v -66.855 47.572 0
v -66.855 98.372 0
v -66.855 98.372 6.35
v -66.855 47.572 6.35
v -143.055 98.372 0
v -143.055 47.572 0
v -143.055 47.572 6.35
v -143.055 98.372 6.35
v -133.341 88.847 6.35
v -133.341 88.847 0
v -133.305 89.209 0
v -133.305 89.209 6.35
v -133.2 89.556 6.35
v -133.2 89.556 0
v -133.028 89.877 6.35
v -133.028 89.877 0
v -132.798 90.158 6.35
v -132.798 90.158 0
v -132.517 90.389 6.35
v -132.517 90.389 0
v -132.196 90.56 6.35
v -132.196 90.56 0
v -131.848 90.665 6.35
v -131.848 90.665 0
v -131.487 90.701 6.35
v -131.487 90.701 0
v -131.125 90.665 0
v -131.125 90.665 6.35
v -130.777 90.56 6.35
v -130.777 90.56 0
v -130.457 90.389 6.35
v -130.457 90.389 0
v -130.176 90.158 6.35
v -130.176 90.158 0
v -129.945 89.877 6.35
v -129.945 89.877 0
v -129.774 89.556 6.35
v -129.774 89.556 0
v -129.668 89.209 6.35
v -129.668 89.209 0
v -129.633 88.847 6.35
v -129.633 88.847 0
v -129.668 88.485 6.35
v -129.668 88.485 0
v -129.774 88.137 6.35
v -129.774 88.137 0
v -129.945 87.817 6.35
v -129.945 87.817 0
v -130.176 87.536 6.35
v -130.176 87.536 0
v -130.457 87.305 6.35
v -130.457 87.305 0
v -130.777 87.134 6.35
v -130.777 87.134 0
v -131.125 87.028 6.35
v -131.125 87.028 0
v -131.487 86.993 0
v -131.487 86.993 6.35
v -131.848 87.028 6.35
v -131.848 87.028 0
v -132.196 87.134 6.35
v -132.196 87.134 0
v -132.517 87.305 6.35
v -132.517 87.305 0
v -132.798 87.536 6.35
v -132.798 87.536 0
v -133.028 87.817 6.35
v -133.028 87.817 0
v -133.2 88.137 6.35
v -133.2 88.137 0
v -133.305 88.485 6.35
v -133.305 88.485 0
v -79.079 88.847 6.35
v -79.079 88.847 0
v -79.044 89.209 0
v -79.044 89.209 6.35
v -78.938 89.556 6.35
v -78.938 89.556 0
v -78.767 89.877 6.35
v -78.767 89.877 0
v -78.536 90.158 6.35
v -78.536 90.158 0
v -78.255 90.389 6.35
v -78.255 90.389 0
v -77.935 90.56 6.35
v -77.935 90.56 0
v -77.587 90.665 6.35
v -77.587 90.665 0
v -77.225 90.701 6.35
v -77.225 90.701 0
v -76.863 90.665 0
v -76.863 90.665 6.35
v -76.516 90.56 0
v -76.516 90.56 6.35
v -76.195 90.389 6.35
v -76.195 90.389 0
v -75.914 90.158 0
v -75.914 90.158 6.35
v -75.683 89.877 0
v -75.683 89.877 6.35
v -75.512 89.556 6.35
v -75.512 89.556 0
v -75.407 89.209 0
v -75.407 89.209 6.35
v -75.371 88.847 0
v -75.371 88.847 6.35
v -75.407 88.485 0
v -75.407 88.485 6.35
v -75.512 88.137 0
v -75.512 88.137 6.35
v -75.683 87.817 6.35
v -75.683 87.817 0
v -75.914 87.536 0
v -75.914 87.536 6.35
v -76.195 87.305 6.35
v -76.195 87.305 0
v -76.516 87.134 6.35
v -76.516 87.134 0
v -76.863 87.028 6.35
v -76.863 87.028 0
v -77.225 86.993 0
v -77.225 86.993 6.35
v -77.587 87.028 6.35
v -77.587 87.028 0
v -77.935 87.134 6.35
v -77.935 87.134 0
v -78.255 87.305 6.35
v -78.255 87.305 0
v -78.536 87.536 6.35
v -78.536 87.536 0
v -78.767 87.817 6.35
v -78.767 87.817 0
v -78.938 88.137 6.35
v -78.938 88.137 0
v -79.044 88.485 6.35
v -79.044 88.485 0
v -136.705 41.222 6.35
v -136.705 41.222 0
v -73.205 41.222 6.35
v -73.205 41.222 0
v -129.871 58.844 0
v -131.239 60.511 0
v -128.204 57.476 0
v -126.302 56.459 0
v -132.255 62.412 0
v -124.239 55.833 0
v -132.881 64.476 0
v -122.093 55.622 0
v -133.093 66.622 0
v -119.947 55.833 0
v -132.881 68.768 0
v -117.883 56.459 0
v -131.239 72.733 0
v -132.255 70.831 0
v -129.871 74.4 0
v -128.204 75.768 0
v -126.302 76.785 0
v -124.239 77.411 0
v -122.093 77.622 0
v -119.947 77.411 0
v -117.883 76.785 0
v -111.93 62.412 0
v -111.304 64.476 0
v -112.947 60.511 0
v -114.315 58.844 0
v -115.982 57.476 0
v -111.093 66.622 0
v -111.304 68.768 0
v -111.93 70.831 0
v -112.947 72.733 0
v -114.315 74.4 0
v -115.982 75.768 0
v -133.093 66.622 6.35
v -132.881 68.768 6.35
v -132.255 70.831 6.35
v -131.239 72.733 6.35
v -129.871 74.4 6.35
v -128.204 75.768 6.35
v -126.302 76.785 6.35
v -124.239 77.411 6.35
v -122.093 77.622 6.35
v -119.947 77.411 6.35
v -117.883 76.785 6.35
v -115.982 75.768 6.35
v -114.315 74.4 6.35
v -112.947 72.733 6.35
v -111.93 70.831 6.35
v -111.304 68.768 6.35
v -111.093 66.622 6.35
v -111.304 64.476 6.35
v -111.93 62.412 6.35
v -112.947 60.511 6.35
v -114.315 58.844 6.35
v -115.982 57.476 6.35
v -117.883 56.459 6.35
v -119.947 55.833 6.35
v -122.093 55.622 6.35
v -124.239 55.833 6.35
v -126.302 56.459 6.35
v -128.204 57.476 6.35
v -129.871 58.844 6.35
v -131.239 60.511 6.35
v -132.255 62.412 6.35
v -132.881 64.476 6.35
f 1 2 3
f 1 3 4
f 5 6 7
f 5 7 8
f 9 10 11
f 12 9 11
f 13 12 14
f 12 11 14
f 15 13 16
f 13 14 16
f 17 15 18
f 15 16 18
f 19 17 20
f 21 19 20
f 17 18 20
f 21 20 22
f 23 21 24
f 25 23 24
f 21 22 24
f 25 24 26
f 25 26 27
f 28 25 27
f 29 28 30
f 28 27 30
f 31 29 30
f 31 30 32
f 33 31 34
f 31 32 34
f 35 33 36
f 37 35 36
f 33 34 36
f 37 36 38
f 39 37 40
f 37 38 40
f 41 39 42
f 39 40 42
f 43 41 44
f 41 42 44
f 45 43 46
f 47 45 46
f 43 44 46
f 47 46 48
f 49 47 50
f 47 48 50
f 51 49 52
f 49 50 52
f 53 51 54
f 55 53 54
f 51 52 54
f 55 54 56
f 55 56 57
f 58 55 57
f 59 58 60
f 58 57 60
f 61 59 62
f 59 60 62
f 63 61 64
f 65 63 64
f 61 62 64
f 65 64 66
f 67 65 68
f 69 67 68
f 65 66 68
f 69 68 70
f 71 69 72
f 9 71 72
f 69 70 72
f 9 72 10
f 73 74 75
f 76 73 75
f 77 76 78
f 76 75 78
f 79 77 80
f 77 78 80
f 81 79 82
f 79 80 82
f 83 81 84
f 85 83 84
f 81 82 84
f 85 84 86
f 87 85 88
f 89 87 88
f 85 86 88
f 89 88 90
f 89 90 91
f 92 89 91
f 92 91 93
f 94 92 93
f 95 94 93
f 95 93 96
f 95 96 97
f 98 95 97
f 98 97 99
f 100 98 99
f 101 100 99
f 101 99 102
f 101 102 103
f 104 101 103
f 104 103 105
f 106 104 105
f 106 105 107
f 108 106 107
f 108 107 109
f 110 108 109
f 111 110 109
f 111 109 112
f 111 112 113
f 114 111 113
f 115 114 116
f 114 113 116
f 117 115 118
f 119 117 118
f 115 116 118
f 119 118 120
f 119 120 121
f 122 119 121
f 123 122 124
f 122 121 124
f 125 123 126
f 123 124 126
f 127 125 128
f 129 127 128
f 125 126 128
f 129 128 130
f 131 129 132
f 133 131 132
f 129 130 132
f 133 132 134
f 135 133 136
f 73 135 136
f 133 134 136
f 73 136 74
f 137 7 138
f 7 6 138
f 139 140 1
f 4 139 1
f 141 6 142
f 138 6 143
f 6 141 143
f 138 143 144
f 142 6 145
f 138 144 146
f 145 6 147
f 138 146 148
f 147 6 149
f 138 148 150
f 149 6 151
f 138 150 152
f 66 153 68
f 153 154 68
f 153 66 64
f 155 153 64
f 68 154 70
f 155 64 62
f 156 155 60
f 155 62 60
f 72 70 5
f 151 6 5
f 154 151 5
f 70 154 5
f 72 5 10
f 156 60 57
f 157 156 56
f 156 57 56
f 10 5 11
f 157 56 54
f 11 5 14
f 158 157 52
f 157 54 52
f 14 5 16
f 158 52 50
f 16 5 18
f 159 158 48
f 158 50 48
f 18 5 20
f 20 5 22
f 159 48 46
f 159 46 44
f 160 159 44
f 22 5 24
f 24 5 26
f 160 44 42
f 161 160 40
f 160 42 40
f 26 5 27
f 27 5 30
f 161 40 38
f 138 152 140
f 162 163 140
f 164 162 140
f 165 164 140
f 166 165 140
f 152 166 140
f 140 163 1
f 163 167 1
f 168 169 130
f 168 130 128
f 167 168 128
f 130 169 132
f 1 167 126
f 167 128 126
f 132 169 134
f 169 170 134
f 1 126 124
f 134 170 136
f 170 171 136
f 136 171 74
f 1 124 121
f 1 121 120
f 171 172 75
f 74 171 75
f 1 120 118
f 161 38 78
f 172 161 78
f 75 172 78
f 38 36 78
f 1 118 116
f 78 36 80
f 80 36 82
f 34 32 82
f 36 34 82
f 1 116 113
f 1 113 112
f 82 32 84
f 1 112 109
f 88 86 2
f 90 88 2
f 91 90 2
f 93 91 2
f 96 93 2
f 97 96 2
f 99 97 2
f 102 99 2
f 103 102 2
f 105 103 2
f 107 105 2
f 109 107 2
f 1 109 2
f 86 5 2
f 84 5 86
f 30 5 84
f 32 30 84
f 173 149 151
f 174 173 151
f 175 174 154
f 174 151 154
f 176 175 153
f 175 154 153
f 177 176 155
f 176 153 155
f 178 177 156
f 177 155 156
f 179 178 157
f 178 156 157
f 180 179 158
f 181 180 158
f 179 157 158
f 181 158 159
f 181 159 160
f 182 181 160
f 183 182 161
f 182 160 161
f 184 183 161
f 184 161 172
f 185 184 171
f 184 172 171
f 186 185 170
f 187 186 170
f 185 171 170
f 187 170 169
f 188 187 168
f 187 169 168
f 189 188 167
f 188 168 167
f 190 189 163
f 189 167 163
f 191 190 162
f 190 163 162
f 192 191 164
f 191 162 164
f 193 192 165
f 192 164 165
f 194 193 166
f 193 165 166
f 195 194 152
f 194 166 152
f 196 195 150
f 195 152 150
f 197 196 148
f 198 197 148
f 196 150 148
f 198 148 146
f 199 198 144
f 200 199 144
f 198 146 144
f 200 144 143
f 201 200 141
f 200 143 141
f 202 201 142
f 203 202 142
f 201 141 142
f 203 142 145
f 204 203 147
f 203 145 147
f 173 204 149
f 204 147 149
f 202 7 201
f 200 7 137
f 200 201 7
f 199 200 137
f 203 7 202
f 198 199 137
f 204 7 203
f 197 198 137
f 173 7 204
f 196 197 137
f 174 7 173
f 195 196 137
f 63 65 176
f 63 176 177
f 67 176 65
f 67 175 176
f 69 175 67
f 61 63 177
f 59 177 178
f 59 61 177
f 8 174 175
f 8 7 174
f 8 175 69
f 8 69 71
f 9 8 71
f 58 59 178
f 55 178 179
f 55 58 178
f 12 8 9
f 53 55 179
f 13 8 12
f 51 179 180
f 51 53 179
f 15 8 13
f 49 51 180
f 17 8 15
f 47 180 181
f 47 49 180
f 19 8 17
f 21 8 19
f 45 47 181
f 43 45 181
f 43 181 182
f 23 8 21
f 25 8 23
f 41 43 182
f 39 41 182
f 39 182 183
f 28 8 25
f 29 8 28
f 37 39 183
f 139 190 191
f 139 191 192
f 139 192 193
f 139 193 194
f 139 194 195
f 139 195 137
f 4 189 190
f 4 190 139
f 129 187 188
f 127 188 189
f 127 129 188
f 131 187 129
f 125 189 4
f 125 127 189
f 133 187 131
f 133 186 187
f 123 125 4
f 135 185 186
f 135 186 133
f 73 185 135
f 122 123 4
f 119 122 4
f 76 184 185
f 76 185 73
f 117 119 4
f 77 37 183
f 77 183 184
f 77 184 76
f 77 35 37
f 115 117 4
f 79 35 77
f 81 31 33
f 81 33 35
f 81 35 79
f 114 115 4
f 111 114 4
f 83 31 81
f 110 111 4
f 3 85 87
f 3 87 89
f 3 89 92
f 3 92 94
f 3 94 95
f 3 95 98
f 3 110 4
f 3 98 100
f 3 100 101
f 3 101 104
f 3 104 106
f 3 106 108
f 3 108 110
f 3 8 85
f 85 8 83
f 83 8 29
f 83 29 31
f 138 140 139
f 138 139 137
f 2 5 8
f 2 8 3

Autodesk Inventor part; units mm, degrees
ref_plane "YZ Plane" through (0, 0, 0) normal (1, 0, 0) x (0, 1, 0)
ref_plane "XZ Plane" through (0, 0, 0) normal (0, 1, 0) x (-1, 0, 0)
ref_plane "XY Plane" through (0, 0, 0) normal (0, 0, 1) x (1, 0, 0)
sketch "Sketch1" plane through (0, 0, 0) normal (0, 0, 1) x (1, 0, 0)
  line L0 (-73.2051, 41.2219) -> (-136.7051, 41.2219)
  line L1 (-143.0551, 47.5719) -> (-143.0551, 98.3719)
  line L2 (-143.0551, 98.3719) -> (-66.8551, 98.3719)
  line L3 (-66.8551, 98.3719) -> (-66.8551, 47.5719)
  line L4 (-143.0551, 47.5719) -> (-136.7051, 41.2219)
  line L5 (-73.2051, 41.2219) -> (-66.8551, 47.5719)
  point P0 (0, 0)
  point P1 (-66.8551, 41.2219)
  point P2 (-143.0551, 41.2219)
  point P3 (-117.6551, 41.2219)
  point P4 (-143.0551, 66.6219)
  point P5 (-66.8551, 72.9719)
  point P6 (-92.2551, 41.2219)
  point P7 (-143.0551, 41.2219)
  point P8 (-66.8551, 41.2219)
  dimension "d0" = 76.2
  dimension "d1" = 57.15
  dimension "d10" = 6.35
  dimension "d11" = 6.35
  dimension "d12" = 6.35
extrude "Extrusion1" add sketch "Sketch1" along normal blind 6.35
sketch "Sketch2" plane through (0, 0, 6.35) normal (0, 0, 1) x (1, 0, 0)
  line L0 (-130.3551, 77.0986) -> (-130.3551, 56.1453)
  line L1 (-130.3551, 66.6219) -> (-98.3601, 66.6219) construction
  arc A0 (-119.7326, 65.7975) -> (-124.4934, 65.9243) centre (-122.0928, 66.6219) ccw
  line L2 (-124.4934, 65.9243) -> (-119.7326, 65.7975) projected
  point P0 (0, 0)
  dimension "d4" = 5
extrude "Extrusion2" cut sketch "Sketch2" against normal through all
sketch "Sketch3" plane through (0, 0, 0) normal (0, 0, -1) x (-1, 0, 0)
  arc A0 (124.4934, 65.9243) -> (119.7326, 65.7975) centre (122.0928, 66.6219) ccw projected
  line L0 (124.4934, 65.9243) -> (119.7326, 65.7975) projected
  circle A1 centre (122.0928, 66.6219) radius 11
  point P0 (0, 0)
extrude "Extrusion3" cut sketch "Sketch3" against normal through all
sketch "Sketch4" plane through (0, 0, 0) normal (0, 0, -1) x (-1, 0, 0)
  line L0 (143.0551, 92.0219) -> (133.3409, 92.0219) construction
  line L1 (143.0551, 85.6719) -> (133.3409, 85.6719) construction
  line L2 (143.0551, 85.6719) -> (143.0551, 98.3719) construction
  line L3 (35.1051, 88.8469) -> (143.0551, 88.8469) construction
  circle A0 centre (77.2251, 88.8469) radius 1.8542
  circle A1 centre (131.4867, 88.8469) radius 1.8542
  line L4 (133.3409, 92.0219) -> (133.3409, 85.6719) projected
  point P0 (0, 0)
  dimension "d15" = 3.7084
  dimension "d16" = 3.7084
extrude "Extrusion4" cut sketch "Sketch4" against normal through all
equation "\"d10\" = d9"
equation "\"d12\" = d11"
equation "\"d9\" = 6.35"
properties part number "projectorMountSide" material "Nylon, molybdenum disulphide"
